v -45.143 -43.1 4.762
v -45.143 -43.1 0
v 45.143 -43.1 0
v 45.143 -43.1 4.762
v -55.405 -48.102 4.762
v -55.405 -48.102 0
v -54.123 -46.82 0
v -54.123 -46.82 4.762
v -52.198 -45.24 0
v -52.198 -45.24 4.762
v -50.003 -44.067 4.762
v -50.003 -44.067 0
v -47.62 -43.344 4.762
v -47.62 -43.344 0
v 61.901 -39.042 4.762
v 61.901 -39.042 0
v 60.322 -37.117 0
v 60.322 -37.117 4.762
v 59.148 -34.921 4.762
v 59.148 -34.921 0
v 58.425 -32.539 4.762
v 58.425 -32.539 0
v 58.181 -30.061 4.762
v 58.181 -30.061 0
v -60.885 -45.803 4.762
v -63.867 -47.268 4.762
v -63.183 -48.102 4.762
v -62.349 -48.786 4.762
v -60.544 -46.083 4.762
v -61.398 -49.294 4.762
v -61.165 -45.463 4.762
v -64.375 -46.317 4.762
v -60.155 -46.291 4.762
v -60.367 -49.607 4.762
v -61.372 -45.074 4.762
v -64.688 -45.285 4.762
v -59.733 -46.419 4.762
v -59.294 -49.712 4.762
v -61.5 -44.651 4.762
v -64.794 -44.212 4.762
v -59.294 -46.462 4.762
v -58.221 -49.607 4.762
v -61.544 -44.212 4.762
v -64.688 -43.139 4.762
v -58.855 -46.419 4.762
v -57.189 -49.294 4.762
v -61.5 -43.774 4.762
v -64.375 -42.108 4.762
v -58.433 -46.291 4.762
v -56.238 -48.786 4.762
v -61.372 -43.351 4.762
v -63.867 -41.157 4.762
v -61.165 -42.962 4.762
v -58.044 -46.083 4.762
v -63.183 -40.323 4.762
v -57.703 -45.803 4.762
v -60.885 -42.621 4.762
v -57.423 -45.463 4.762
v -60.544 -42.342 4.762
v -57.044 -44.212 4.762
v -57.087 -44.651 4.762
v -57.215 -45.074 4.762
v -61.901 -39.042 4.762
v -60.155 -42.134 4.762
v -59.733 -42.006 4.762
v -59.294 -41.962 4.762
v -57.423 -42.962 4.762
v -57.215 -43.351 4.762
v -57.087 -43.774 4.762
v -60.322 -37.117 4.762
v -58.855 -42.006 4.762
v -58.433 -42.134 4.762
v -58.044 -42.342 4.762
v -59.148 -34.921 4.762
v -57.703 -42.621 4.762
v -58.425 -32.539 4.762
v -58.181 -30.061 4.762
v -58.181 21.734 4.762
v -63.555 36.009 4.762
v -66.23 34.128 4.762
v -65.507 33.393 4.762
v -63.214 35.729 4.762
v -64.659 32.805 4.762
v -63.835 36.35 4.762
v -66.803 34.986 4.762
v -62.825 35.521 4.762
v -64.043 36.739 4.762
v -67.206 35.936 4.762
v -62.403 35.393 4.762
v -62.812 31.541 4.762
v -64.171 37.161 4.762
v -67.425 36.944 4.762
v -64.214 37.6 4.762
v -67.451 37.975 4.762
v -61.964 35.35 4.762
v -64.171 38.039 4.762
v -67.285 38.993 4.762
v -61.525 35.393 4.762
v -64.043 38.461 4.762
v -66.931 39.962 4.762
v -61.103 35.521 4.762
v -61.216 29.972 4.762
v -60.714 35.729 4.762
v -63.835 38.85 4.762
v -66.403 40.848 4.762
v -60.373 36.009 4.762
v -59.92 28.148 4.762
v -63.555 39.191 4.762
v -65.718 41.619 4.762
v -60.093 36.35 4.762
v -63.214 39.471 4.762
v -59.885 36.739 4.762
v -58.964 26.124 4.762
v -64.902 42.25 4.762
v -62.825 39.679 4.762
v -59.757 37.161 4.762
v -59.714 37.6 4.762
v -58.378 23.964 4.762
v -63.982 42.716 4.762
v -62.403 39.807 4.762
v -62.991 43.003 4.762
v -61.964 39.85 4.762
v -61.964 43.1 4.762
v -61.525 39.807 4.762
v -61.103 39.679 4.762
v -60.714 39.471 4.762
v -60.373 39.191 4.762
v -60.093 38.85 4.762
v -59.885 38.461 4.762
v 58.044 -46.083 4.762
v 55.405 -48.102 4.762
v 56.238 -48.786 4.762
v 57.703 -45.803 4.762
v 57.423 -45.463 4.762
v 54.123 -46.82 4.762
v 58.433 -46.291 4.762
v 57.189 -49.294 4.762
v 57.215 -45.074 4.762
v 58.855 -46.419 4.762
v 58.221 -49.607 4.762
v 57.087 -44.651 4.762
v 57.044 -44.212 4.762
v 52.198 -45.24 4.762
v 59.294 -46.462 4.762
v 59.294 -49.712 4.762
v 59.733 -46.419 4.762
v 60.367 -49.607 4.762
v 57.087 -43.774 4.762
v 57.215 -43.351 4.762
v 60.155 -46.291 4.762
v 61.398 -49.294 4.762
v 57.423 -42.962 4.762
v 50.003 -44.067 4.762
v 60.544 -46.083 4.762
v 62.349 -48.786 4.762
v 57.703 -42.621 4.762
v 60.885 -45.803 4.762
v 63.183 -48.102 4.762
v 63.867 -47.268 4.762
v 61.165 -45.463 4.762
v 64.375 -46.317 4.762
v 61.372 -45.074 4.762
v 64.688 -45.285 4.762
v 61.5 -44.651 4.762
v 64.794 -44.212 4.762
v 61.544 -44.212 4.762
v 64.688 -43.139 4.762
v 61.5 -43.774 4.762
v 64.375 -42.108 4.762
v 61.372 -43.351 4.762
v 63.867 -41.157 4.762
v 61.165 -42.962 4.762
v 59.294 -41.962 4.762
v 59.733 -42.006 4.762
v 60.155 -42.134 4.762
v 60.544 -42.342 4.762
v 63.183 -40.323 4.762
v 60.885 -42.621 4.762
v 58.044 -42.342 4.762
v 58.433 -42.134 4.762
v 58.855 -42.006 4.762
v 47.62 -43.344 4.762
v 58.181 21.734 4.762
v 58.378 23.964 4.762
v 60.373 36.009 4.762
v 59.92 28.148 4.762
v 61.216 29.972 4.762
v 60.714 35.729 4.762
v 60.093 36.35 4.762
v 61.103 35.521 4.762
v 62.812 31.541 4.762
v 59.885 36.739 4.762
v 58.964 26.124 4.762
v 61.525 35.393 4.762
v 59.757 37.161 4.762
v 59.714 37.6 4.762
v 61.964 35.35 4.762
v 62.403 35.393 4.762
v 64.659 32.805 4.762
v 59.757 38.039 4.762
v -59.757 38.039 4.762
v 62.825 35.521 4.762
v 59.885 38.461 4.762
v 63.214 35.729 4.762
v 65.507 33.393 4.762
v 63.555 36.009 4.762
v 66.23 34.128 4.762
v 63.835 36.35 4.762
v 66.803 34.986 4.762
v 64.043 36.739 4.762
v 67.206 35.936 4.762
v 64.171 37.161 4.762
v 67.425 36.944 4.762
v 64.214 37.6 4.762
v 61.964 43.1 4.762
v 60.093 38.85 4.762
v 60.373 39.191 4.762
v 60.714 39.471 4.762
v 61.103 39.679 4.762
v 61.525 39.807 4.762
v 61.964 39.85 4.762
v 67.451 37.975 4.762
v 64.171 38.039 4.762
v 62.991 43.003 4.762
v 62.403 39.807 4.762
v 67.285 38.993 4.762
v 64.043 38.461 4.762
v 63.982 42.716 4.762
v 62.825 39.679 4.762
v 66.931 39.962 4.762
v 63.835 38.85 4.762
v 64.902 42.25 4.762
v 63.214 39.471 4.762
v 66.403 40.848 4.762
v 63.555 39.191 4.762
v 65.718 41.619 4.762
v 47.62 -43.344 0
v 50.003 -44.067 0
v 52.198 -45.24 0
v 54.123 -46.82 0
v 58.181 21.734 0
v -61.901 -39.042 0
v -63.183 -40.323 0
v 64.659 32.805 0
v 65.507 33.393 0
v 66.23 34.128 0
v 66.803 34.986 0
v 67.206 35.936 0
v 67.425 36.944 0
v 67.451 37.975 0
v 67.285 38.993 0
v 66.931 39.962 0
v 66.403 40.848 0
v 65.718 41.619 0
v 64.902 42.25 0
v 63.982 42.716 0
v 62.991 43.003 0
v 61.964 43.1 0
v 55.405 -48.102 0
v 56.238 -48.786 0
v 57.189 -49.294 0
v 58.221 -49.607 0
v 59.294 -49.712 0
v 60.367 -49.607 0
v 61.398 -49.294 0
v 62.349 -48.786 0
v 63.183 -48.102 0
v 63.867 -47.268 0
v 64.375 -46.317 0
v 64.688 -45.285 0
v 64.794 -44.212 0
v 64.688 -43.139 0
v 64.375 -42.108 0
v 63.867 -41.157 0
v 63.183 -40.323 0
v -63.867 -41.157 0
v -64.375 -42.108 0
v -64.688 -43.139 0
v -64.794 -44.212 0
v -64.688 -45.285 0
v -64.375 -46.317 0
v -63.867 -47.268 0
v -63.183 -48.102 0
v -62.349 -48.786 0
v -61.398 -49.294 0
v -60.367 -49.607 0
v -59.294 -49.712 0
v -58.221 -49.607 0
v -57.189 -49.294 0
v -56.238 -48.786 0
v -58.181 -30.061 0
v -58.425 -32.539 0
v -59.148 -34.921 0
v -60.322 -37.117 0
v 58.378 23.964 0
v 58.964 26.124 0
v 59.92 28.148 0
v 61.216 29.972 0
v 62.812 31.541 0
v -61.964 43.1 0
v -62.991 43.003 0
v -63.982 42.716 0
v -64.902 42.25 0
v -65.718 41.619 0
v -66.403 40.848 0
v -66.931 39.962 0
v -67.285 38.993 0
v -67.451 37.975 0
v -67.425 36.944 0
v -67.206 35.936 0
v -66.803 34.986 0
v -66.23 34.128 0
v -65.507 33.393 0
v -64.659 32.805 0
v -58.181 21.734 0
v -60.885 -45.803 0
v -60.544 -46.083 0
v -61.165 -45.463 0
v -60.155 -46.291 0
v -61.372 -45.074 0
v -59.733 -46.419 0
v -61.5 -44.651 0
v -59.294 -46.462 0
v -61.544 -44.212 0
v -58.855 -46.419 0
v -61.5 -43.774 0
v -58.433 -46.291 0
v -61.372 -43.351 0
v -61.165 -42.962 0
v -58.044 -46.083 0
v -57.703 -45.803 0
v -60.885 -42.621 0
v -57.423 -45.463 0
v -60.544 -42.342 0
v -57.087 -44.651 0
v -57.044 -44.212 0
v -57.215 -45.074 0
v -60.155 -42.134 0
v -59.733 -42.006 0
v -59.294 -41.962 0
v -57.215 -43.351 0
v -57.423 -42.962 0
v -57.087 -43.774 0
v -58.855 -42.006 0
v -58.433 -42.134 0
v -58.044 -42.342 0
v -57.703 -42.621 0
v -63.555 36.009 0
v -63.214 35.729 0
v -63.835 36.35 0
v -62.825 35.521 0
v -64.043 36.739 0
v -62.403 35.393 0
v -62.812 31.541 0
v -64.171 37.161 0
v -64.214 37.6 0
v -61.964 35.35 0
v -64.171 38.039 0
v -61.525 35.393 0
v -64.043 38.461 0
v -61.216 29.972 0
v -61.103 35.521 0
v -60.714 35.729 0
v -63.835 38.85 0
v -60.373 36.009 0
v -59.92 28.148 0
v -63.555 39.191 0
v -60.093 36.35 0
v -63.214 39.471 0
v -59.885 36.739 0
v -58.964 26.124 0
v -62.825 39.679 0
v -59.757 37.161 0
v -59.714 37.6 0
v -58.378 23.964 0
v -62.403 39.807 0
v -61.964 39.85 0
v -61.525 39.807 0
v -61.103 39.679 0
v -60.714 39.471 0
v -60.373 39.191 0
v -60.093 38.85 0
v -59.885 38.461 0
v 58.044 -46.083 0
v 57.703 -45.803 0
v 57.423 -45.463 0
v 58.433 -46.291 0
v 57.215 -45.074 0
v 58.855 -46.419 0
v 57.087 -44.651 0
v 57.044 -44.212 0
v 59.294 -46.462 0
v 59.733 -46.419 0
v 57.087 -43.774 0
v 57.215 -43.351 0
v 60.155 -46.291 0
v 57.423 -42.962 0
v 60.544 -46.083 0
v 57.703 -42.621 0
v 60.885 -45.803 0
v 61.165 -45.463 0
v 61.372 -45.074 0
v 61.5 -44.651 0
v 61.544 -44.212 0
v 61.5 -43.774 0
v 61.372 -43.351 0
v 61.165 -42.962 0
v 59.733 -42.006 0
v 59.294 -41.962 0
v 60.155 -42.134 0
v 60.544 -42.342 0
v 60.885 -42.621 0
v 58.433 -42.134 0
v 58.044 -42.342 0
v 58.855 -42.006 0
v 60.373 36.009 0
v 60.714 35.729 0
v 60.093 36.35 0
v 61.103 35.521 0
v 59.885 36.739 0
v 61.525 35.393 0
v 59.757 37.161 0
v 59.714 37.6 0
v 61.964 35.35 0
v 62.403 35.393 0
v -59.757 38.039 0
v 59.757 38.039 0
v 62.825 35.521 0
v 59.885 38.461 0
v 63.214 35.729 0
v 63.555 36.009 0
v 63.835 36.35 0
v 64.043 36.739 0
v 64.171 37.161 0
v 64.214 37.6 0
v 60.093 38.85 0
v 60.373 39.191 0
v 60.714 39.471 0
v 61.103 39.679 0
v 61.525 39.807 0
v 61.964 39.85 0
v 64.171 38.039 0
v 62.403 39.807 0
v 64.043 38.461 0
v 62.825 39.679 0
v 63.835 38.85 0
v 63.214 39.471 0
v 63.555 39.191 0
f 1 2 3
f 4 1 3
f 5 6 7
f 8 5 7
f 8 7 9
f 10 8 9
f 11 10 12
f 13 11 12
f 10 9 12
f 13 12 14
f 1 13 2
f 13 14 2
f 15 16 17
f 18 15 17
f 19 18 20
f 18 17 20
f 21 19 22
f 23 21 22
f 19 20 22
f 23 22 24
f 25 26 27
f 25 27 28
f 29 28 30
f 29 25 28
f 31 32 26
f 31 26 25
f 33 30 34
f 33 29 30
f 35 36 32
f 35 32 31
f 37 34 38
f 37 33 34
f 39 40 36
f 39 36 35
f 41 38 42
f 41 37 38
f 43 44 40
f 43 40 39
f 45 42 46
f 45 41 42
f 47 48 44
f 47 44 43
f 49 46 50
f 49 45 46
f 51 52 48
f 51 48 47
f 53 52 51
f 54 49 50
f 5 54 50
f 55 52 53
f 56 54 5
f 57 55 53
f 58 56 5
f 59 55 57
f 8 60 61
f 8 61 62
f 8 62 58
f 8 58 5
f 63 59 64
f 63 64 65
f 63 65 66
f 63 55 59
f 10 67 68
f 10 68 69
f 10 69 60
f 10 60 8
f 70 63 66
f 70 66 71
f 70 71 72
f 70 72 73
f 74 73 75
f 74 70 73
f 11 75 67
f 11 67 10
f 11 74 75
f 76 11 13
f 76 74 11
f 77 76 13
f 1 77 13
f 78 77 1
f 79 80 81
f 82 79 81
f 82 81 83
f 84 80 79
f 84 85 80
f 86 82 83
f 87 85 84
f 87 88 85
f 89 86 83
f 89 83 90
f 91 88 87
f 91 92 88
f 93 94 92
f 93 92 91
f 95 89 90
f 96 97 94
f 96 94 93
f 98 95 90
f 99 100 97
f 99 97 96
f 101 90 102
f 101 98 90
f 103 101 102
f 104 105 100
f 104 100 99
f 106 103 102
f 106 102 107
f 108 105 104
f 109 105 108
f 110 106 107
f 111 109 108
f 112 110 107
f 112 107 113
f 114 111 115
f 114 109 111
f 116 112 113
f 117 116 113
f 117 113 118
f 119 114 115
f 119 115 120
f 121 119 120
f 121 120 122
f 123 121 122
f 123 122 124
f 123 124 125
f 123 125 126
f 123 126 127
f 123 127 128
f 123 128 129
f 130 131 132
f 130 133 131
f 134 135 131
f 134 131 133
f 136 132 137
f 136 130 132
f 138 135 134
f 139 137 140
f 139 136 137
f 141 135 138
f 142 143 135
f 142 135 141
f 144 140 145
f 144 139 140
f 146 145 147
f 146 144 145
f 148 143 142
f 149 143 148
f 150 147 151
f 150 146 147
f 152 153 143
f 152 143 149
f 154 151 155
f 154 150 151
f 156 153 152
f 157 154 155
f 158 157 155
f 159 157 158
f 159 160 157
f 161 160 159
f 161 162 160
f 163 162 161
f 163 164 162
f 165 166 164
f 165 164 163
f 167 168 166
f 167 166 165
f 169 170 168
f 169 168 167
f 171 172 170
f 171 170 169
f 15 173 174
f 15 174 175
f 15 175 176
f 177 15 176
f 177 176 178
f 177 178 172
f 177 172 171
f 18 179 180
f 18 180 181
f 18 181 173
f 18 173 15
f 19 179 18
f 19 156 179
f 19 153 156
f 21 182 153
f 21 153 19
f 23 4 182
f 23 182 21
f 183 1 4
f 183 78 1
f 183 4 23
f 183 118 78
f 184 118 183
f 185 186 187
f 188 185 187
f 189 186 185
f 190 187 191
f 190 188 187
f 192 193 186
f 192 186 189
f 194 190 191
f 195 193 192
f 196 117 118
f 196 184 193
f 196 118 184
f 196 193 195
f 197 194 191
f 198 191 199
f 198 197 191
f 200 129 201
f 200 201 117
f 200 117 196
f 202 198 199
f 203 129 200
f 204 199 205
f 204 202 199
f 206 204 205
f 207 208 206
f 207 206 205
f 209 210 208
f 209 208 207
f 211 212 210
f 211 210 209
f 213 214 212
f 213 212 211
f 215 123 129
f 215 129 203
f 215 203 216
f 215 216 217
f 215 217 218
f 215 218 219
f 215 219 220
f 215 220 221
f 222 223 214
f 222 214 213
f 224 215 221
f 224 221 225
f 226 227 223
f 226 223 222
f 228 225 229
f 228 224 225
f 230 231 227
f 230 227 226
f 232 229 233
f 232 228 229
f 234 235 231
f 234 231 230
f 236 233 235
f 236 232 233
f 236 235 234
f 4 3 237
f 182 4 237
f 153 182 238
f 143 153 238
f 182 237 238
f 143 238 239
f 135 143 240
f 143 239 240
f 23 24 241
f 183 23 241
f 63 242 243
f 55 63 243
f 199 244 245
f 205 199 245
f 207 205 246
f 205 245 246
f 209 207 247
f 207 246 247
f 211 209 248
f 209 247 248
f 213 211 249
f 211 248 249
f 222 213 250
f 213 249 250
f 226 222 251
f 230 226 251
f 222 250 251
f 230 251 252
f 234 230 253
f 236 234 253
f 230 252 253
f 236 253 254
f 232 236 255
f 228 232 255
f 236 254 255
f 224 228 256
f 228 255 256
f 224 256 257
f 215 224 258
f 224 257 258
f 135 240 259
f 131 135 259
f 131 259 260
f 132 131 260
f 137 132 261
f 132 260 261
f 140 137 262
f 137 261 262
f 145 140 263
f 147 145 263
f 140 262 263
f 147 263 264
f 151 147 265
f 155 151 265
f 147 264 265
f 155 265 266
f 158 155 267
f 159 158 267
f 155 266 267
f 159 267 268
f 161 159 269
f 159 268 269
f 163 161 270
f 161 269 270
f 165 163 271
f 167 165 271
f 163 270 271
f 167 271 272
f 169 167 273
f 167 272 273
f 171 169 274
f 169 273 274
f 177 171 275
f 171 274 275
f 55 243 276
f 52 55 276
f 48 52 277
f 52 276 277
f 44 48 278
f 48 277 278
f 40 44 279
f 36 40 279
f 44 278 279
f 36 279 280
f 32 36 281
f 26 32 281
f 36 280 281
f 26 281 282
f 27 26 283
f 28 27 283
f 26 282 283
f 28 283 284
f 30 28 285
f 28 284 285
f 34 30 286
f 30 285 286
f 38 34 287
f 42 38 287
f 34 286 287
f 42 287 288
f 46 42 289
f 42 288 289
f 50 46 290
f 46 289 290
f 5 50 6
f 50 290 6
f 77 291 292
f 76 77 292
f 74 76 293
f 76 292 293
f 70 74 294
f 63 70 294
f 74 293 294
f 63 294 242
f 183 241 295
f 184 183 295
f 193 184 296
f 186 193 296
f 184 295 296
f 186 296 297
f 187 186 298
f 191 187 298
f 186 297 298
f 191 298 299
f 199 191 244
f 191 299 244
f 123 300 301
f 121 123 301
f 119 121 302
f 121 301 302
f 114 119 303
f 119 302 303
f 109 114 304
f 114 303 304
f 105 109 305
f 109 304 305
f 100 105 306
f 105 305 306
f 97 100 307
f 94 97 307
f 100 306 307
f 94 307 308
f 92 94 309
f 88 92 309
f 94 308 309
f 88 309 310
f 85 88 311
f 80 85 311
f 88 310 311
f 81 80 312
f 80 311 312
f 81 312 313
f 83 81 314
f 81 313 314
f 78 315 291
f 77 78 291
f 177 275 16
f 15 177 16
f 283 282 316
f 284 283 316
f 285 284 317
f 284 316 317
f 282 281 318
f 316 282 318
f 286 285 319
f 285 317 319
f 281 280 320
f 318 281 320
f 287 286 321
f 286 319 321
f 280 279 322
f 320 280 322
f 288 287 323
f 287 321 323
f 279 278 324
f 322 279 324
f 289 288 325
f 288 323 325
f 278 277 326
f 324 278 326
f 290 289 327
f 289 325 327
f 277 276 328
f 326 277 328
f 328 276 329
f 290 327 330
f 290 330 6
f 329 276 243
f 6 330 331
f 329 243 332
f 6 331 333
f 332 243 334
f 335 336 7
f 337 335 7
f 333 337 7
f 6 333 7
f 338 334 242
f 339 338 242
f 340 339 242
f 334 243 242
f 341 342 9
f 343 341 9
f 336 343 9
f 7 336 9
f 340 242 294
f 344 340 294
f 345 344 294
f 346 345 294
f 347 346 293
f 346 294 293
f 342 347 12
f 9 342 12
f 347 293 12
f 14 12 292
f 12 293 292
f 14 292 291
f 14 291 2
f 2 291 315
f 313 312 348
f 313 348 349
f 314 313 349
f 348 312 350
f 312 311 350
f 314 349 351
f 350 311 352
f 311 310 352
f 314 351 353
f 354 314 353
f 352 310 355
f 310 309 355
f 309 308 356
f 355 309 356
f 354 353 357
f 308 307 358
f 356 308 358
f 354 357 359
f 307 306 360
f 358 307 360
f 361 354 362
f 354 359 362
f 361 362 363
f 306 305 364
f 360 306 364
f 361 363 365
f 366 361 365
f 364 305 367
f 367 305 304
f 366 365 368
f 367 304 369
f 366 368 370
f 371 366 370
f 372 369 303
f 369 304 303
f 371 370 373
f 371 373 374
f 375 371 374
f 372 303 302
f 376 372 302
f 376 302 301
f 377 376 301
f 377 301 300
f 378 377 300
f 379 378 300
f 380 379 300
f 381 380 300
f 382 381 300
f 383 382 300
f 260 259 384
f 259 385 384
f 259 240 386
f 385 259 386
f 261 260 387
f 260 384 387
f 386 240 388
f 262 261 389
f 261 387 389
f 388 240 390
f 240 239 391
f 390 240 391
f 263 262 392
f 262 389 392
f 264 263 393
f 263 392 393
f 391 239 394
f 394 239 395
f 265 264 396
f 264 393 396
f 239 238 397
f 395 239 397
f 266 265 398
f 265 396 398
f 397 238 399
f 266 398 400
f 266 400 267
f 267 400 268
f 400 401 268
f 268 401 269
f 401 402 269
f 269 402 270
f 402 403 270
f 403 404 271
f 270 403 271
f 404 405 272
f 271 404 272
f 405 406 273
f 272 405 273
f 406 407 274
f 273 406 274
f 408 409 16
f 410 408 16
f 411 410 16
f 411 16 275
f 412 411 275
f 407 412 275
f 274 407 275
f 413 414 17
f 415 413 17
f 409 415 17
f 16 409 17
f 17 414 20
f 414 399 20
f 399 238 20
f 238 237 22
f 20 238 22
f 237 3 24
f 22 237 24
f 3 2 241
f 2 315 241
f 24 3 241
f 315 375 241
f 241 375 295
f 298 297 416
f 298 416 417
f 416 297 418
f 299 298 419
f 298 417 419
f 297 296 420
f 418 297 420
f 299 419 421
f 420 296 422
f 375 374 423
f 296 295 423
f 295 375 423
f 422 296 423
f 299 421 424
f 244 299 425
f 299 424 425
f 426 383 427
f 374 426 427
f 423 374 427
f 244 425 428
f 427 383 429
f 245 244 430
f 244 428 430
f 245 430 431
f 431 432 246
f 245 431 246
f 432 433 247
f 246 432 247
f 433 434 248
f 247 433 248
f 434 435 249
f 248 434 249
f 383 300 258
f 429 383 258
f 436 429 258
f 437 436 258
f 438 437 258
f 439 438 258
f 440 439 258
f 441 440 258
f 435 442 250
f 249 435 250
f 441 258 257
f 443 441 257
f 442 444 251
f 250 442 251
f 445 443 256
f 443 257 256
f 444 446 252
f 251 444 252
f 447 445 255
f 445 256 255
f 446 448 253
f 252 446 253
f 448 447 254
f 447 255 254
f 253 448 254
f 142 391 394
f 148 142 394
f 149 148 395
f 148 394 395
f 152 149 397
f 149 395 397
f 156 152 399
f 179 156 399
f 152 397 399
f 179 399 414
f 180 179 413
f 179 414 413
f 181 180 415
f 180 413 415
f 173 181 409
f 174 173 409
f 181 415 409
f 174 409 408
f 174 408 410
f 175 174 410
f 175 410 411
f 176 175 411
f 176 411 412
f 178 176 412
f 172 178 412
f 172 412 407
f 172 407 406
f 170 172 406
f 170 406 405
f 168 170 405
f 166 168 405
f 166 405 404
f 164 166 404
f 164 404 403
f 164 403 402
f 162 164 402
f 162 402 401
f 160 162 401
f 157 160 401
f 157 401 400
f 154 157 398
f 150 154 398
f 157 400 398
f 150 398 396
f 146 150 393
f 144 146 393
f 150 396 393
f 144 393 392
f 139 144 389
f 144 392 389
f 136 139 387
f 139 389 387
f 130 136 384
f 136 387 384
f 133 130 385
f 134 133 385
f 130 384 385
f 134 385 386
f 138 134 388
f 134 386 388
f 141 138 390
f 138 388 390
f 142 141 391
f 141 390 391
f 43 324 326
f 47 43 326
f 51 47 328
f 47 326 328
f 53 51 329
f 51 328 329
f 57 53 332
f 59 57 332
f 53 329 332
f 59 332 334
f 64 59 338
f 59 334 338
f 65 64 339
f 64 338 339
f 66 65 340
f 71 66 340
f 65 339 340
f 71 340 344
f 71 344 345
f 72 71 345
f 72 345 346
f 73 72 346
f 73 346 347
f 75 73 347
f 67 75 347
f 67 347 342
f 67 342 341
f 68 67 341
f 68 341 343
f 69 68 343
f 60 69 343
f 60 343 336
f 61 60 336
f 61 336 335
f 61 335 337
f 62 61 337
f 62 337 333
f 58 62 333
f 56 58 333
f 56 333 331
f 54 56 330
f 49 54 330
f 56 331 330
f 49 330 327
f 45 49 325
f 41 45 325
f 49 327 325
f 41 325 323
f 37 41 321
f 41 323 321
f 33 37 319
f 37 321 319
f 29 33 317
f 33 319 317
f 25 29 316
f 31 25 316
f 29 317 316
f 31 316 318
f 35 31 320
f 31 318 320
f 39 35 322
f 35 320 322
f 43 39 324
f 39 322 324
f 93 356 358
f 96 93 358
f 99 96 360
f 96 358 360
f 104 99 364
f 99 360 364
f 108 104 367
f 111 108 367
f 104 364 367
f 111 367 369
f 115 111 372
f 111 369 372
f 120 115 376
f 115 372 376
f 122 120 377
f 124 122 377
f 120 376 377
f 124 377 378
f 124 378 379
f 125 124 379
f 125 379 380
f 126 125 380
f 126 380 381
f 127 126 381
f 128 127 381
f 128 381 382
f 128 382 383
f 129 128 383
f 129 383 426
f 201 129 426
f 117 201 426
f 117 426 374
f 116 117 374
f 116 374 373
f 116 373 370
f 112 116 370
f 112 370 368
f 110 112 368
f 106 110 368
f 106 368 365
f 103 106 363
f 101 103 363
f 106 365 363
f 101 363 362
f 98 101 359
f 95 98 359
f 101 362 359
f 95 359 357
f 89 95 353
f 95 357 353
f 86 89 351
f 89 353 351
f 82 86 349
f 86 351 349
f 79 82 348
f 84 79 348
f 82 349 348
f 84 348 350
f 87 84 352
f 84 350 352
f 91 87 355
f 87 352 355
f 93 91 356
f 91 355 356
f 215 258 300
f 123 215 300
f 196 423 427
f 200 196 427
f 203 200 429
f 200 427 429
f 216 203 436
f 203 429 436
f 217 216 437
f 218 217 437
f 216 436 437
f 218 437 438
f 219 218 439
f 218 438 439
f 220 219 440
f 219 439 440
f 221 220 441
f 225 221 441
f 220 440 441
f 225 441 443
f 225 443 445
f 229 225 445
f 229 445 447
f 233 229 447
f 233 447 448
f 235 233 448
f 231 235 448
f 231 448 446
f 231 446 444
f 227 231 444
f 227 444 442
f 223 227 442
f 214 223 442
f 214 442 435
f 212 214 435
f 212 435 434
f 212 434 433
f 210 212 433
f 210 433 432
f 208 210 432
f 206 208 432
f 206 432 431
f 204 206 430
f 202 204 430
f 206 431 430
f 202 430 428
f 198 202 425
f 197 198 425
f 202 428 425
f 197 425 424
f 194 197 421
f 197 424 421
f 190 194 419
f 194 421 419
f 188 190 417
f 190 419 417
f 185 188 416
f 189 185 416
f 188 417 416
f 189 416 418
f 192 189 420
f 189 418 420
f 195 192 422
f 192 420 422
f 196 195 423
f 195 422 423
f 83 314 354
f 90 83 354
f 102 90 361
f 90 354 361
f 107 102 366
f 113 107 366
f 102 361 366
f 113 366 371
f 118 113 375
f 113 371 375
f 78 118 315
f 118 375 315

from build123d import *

# Parameters (mm, degrees)
BOSS_EXTRUDE1_DEPTH  = 4.7625
M4_CLEARANCE_HOLE1_D = 4.5


with BuildPart() as part:
    # Sketch2 → Boss-Extrude1 (new body)
    with BuildSketch(Plane.XY):
        with BuildLine():
            Line((-58.18125, 21.734258268), (-58.18125, -30.061313165))
            ThreePointArc((-58.18125, -30.061313165), (-59.147979937, -34.921392756), (-61.900993879, -39.041569286))
            Line((-61.900993879, -39.041569286), (-63.182817689, -40.323393096))
            ThreePointArc((-63.182817689, -40.323393096), (-63.182817689, -48.101567689), (-55.404643096, -48.101567689))
            Line((-55.404643096, -48.101567689), (-54.122819286, -46.819743879))
            ThreePointArc((-54.122819286, -46.819743879), (-50.002642756, -44.066729937), (-45.142563165, -43.1))
            Line((-45.142563165, -43.1), (45.142563165, -43.1))
            ThreePointArc((45.142563165, -43.1), (50.002642756, -44.066729937), (54.122819286, -46.819743879))
            Line((54.122819286, -46.819743879), (55.404643096, -48.101567689))
            ThreePointArc((55.404643096, -48.101567689), (63.182817689, -48.101567689), (63.182817689, -40.323393096))
            Line((63.182817689, -40.323393096), (61.900993879, -39.041569286))
            ThreePointArc((61.900993879, -39.041569286), (59.147979937, -34.921392756), (58.18125, -30.061313165))
            Line((58.18125, -30.061313165), (58.18125, 21.734258268))
            ThreePointArc((58.18125, 21.734258268), (59.919591901, 28.147685724), (64.658738462, 32.805407718))
            ThreePointArc((64.658738462, 32.805407718), (67.284676339, 38.9927926), (61.96395, 43.1))
            Line((61.96395, 43.1), (-61.96395, 43.1))
            ThreePointArc((-61.96395, 43.1), (-67.284676339, 38.9927926), (-64.658738462, 32.805407718))
            ThreePointArc((-64.658738462, 32.805407718), (-59.919591901, 28.147685724), (-58.18125, 21.734258268))
        make_face()
    extrude(amount=BOSS_EXTRUDE1_DEPTH)

    # M4 Clearance Hole1 (through all)
    with Locations(Plane.XY.offset(4.7625)):
        with Locations((-59.293730392, -44.212480392), (-61.96395, 37.6), (61.96395, 37.6), (59.293730392, -44.212480392)):
            Hole(M4_CLEARANCE_HOLE1_D / 2)


solid = part.part
